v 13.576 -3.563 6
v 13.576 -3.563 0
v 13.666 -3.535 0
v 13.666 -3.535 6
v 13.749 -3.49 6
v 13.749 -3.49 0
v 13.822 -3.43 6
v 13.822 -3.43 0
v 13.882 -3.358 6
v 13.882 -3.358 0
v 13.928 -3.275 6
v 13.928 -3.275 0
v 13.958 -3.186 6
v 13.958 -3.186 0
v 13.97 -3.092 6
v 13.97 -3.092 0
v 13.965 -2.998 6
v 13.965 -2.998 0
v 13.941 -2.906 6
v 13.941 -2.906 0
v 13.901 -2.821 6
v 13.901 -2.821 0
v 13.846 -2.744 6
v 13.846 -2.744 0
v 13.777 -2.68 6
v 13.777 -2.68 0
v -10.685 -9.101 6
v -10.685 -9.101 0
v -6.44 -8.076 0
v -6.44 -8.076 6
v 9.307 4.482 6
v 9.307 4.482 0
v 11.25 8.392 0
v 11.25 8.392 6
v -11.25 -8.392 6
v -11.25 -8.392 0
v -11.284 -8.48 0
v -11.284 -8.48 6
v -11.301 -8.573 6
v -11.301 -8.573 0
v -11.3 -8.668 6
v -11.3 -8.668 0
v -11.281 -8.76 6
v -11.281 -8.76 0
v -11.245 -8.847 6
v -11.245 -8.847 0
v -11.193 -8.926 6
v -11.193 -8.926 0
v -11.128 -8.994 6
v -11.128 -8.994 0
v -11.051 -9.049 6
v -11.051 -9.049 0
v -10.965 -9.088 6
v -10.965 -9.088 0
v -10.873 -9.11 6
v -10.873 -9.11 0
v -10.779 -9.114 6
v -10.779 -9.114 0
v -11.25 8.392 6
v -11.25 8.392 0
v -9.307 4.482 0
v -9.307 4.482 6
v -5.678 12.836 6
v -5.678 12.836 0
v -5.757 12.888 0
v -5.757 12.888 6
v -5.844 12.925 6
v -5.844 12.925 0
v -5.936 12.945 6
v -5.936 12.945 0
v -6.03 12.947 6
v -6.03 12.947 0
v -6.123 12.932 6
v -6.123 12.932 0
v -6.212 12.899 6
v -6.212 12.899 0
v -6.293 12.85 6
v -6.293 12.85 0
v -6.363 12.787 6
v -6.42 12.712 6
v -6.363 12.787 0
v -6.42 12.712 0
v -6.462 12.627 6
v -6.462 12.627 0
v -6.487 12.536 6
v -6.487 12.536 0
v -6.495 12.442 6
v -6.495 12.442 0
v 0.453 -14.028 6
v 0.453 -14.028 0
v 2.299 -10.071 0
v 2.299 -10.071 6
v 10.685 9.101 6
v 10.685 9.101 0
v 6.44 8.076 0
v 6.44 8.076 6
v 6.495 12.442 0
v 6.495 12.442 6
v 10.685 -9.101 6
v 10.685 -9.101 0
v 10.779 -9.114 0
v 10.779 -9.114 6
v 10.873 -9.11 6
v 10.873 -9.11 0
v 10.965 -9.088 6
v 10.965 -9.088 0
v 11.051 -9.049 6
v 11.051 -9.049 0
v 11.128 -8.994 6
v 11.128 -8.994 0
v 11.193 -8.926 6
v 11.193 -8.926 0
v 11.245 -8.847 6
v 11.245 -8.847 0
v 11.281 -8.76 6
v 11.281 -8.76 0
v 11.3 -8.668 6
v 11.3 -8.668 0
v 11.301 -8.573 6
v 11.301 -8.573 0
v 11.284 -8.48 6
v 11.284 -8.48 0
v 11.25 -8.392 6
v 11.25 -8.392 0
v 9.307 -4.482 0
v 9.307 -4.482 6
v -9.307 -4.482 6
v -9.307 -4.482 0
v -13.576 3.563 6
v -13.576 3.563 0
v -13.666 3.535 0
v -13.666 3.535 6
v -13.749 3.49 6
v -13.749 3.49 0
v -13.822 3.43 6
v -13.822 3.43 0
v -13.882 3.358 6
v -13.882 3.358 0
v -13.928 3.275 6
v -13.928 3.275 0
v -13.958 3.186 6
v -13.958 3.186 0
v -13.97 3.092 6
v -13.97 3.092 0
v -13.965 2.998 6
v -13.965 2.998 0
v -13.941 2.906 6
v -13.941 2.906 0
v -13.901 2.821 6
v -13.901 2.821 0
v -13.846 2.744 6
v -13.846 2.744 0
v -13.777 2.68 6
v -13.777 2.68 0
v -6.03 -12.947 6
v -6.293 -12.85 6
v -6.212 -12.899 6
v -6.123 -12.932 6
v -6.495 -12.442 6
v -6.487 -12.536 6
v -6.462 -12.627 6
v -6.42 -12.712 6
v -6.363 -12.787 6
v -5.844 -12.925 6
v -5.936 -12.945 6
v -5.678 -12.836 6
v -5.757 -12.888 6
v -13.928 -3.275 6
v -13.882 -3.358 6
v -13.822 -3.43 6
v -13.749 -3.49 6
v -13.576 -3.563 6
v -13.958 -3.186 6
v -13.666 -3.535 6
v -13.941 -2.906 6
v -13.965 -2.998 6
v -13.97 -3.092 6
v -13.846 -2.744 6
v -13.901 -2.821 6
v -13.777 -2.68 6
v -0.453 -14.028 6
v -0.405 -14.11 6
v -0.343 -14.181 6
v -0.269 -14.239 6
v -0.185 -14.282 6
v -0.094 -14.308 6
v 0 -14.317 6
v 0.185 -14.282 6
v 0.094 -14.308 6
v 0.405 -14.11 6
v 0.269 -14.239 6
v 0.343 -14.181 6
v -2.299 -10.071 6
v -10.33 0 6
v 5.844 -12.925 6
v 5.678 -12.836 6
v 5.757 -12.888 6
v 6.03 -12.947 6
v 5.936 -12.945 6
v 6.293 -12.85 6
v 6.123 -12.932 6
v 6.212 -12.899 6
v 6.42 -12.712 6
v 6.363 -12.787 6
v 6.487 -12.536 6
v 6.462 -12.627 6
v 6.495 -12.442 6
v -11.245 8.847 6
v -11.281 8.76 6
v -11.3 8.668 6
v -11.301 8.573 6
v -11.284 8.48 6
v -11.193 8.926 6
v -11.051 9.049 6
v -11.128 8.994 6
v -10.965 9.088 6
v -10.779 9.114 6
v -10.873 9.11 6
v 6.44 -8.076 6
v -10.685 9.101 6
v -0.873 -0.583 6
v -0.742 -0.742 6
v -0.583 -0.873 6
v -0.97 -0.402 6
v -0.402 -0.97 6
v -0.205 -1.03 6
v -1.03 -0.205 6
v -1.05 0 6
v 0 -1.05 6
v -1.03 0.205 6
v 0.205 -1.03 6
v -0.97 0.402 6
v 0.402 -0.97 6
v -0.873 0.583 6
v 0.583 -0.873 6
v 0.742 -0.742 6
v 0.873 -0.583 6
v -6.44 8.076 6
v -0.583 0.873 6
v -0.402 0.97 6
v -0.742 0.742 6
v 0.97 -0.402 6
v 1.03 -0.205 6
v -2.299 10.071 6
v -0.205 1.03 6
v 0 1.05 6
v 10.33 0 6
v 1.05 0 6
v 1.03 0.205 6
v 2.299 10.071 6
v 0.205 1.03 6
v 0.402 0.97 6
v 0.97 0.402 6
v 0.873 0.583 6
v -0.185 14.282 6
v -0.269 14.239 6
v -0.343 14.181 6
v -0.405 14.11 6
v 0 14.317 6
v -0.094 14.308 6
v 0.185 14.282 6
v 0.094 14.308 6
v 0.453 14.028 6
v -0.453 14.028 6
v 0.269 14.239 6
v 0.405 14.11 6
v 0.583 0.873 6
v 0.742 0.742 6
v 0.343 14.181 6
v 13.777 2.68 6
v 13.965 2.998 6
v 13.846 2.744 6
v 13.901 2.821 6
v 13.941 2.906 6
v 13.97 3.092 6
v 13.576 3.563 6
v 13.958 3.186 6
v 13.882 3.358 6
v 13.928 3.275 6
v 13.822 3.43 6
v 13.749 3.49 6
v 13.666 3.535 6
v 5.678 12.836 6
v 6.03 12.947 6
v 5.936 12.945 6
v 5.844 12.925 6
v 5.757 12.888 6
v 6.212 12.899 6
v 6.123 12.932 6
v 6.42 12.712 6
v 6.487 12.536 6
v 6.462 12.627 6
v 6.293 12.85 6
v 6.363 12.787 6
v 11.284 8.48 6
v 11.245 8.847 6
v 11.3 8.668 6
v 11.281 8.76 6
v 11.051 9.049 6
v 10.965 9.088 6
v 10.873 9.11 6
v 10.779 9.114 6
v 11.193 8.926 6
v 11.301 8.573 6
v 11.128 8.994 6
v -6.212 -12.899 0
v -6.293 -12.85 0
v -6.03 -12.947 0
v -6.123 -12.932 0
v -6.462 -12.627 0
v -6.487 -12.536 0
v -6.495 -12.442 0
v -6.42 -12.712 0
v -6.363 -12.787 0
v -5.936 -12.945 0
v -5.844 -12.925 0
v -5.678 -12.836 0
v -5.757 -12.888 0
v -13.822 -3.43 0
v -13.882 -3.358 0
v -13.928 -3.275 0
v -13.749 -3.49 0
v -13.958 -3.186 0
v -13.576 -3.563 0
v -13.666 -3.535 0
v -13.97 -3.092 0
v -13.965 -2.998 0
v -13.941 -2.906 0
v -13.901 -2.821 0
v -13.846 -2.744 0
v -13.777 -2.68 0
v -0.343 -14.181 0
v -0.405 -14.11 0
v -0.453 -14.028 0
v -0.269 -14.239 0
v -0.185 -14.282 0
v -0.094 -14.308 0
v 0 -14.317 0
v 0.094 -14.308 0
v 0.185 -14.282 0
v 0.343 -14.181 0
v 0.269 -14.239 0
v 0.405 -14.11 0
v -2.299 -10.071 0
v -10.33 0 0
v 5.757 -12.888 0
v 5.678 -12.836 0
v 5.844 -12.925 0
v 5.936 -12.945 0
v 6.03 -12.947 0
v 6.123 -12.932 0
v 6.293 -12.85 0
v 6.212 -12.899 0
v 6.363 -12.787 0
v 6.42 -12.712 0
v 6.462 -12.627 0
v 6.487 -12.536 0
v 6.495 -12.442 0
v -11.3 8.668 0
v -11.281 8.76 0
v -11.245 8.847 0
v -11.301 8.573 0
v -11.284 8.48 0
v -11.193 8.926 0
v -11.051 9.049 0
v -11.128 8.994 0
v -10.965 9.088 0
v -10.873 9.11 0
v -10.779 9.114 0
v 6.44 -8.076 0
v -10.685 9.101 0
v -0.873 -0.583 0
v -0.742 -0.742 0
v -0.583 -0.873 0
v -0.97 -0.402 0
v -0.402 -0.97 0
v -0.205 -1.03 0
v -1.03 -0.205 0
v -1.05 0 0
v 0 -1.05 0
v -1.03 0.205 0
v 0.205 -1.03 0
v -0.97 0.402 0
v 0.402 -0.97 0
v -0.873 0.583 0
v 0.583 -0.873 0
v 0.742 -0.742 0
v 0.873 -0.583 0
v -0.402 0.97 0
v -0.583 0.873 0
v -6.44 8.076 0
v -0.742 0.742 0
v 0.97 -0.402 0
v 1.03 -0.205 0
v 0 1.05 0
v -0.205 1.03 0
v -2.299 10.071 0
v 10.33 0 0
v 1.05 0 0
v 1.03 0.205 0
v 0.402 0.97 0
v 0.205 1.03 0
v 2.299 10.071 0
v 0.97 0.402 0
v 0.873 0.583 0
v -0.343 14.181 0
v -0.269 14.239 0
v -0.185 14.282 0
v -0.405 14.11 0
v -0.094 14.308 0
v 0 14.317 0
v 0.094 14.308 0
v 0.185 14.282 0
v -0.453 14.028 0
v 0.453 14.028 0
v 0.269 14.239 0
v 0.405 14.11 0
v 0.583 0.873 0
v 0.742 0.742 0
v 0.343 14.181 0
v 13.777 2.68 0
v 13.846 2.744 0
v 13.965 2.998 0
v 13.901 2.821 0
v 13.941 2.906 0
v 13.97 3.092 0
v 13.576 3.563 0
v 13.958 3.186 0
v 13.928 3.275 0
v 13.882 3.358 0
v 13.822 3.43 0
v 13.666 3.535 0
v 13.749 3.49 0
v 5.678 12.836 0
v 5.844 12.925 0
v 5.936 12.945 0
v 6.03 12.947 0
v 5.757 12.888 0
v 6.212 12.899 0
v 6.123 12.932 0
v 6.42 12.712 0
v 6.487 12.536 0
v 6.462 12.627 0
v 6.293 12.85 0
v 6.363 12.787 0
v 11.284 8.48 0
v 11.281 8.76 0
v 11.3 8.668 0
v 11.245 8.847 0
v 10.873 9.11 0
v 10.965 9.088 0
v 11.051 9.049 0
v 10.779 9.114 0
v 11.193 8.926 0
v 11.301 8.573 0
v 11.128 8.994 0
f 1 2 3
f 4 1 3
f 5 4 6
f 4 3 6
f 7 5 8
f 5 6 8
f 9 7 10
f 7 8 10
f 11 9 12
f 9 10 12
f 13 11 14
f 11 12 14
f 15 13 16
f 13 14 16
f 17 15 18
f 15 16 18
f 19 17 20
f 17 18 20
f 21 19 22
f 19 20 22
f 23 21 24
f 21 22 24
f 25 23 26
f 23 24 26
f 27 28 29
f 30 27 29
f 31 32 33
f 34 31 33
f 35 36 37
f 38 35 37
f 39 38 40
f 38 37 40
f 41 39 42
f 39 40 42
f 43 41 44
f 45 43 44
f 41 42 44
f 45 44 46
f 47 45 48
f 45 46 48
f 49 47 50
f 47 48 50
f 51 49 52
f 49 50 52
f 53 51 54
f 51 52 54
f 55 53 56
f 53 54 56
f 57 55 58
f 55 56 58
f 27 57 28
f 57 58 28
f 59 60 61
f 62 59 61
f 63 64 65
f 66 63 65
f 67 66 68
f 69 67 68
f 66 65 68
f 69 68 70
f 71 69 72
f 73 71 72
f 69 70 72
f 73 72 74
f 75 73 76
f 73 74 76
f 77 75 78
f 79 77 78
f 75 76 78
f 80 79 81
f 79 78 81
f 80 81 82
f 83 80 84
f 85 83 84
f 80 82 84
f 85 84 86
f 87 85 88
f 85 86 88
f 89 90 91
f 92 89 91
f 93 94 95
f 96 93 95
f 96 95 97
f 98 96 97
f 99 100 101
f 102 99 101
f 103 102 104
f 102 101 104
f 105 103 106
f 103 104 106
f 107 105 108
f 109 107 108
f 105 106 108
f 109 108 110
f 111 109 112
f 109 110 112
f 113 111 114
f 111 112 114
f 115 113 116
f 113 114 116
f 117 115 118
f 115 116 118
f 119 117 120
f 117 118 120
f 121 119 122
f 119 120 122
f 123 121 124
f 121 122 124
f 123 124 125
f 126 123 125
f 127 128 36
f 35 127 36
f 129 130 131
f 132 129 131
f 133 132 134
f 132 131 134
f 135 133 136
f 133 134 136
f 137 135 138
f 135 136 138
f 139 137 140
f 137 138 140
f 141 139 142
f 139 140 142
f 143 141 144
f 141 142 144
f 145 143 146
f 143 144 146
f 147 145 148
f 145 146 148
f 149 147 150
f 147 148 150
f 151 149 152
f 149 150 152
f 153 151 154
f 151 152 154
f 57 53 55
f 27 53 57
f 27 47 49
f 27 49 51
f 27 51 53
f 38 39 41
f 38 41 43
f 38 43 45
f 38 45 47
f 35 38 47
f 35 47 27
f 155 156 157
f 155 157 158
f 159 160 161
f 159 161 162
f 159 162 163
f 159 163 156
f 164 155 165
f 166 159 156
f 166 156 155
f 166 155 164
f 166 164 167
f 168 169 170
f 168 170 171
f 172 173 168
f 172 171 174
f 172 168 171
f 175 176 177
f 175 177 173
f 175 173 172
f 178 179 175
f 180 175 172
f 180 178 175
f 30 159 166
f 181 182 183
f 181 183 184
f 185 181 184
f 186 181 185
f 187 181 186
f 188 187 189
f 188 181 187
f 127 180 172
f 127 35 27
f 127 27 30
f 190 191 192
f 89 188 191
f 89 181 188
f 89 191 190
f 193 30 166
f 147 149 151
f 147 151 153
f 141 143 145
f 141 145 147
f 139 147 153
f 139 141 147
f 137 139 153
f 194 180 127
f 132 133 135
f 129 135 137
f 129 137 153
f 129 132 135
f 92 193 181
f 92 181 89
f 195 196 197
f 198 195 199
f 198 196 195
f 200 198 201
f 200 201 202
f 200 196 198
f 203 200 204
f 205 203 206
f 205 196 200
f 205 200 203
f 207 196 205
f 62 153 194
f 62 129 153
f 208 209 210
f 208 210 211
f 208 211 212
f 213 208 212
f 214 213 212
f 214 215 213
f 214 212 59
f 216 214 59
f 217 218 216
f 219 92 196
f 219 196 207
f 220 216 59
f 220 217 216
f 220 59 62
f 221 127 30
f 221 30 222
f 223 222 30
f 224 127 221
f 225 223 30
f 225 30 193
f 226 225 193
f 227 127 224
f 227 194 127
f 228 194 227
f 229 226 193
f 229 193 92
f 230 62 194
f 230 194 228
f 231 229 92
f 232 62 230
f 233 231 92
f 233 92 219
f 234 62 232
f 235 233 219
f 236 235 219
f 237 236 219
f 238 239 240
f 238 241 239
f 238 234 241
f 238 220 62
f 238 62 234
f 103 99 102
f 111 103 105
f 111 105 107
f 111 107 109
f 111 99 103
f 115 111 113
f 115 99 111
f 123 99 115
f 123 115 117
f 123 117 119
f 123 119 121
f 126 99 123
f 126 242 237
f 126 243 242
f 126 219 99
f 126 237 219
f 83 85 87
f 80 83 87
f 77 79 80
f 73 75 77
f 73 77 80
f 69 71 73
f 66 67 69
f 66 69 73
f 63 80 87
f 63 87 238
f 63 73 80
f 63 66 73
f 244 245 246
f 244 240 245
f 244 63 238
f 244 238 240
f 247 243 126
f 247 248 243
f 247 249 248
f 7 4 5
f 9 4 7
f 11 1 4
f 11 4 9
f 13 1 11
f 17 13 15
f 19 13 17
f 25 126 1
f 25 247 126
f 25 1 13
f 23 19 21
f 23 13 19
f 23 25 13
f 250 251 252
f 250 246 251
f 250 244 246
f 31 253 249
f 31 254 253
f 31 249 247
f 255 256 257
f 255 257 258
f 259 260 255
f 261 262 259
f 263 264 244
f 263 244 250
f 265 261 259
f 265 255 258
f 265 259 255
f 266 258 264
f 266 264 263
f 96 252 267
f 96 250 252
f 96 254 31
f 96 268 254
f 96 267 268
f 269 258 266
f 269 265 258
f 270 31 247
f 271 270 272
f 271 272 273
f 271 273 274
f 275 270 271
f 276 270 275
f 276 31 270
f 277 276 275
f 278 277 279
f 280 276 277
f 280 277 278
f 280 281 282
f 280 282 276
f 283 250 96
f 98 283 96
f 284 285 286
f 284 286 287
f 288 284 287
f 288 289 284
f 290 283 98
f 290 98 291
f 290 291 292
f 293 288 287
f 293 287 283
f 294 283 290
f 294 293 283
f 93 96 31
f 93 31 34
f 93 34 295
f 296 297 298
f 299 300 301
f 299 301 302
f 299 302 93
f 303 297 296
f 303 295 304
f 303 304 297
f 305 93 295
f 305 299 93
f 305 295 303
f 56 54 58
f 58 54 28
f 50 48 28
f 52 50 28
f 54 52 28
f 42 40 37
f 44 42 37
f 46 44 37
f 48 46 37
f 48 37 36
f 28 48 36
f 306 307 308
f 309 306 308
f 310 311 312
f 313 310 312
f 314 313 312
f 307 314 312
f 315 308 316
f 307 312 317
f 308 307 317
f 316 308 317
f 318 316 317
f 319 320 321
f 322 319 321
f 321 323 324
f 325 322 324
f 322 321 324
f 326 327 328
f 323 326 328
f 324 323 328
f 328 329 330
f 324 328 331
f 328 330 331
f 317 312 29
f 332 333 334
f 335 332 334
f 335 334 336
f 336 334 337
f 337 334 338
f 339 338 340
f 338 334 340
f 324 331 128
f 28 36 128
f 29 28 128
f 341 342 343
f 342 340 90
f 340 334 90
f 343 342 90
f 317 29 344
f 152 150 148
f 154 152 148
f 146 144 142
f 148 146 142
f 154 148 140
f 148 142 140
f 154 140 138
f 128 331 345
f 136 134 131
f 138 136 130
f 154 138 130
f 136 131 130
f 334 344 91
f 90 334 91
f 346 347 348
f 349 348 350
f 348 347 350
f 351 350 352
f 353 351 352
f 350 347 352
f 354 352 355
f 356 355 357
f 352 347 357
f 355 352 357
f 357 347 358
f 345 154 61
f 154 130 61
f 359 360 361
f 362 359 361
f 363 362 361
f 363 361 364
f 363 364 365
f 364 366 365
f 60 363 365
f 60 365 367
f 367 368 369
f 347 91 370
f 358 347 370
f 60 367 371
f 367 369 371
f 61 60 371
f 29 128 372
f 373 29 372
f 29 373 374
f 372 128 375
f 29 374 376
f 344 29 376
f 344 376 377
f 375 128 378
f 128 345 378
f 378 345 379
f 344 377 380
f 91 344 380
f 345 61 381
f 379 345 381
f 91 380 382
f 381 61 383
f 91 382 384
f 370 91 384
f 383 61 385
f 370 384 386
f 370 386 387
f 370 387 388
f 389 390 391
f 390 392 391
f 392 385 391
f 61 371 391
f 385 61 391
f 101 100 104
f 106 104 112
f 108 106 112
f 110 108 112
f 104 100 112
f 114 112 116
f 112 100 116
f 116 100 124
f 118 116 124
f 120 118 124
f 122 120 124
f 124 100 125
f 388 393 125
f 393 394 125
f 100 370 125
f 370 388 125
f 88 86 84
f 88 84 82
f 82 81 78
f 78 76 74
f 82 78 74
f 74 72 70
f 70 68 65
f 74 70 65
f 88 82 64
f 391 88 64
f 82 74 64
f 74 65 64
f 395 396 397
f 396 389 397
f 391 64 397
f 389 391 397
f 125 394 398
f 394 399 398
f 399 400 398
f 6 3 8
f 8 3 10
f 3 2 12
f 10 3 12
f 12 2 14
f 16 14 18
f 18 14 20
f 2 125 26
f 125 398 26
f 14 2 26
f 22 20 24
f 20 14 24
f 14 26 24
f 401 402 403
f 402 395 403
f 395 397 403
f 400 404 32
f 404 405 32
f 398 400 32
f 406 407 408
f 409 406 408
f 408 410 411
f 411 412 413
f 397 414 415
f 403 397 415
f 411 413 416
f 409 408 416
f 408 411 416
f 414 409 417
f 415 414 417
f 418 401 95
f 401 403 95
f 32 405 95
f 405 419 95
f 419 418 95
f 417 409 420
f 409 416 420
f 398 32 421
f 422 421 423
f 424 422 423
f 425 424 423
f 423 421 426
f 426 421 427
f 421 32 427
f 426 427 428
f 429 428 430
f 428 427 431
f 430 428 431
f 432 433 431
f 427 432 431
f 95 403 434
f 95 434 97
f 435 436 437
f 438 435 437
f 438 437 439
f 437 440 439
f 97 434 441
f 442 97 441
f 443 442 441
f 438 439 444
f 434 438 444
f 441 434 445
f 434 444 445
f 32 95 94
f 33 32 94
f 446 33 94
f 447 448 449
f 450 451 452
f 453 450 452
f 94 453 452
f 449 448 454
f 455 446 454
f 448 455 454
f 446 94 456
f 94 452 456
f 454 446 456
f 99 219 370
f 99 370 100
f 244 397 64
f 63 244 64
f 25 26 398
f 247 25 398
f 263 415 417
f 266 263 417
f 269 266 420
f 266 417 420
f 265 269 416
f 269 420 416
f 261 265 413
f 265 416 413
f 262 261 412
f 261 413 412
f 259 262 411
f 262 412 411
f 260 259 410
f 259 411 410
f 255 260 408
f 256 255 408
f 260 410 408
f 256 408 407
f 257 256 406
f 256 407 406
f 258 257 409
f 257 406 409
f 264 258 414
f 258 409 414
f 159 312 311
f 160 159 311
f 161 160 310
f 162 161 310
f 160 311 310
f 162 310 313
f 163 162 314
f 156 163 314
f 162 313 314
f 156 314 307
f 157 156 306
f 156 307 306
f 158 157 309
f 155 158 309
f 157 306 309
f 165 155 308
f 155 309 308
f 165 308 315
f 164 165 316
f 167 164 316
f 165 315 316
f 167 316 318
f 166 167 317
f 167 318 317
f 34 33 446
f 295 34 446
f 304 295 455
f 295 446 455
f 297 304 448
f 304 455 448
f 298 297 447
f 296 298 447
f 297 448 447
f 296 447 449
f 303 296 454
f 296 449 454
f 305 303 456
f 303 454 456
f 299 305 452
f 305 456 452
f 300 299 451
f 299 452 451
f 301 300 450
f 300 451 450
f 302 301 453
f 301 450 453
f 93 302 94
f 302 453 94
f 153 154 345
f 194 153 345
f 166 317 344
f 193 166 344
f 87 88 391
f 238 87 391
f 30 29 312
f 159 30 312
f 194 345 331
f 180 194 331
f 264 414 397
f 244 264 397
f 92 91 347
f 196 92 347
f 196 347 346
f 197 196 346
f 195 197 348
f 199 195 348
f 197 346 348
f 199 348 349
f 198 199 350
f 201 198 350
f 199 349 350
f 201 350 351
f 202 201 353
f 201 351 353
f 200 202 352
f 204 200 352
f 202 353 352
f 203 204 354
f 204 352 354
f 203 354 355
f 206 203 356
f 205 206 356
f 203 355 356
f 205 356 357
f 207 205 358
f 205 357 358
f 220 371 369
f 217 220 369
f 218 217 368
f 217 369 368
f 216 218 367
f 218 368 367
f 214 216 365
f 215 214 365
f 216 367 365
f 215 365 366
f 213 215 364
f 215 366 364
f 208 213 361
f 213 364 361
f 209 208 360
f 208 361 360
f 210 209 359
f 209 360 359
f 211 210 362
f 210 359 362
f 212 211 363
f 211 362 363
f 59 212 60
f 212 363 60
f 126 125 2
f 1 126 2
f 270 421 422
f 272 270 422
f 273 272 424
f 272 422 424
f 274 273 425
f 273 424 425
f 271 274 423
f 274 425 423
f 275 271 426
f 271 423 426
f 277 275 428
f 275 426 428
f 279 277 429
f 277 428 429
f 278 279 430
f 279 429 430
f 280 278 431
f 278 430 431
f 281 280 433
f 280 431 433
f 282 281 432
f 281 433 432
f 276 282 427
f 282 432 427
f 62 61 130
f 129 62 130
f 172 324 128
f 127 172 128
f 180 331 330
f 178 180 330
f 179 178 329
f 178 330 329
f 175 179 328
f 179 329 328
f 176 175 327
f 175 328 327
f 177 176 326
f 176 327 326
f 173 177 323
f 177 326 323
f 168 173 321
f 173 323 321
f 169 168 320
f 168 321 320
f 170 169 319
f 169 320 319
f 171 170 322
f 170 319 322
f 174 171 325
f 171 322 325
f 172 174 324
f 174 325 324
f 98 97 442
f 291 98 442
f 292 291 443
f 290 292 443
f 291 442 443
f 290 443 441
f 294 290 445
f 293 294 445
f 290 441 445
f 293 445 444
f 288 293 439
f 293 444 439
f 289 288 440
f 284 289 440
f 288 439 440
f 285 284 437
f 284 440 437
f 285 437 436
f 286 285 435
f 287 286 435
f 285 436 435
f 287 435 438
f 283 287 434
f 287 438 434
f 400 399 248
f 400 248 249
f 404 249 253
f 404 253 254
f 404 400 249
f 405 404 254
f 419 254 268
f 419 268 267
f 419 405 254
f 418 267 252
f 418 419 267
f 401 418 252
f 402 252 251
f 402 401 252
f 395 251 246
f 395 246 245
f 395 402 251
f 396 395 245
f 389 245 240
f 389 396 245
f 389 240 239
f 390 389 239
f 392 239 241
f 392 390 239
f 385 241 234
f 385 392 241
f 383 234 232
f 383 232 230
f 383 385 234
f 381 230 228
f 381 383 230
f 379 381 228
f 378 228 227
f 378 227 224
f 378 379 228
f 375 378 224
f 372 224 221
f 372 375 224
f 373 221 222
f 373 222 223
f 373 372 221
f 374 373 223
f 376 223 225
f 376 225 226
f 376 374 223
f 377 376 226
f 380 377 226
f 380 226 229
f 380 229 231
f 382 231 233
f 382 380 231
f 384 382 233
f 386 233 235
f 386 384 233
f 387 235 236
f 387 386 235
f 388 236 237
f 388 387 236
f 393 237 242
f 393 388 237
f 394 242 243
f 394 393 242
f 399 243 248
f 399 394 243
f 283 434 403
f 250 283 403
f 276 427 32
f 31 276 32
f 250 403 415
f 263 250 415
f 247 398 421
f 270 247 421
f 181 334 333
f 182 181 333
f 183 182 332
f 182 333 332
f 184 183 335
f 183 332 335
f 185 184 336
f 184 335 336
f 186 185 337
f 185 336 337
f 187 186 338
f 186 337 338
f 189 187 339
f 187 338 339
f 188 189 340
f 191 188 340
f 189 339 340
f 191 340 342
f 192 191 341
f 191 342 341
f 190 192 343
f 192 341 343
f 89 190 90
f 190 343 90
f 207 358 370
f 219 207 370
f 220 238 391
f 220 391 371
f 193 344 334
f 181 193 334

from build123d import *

# Parameters (mm, degrees)
F0_R     = 1.05
F1_DEPTH = 6


with BuildPart() as f1:
    # F0 (on Top) → F1 (new body)
    with BuildSketch(Plane.XY):
        with BuildLine():
            Line((-2.298571, -10.070698), (-0.453154, -14.028208))
            ThreePointArc((-0.453154, -14.028208), (0, -14.316899), (0.453154, -14.028208))
            Line((0.453154, -14.028208), (2.298571, -10.070698))
            Line((2.298571, -10.070698), (5.678334, -12.835595))
            ThreePointArc((5.678334, -12.835595), (6.21187, -12.89908), (6.494889, -12.442363))
            Line((6.494889, -12.442363), (6.440453, -8.076073))
            Line((6.440453, -8.076073), (10.685158, -9.100735))
            ThreePointArc((10.685158, -9.100735), (11.193403, -8.926441), (11.250232, -8.392155))
            Line((11.250232, -8.392155), (9.306725, -4.481882))
            Line((9.306725, -4.481882), (13.575656, -3.563362))
            ThreePointArc((13.575656, -3.563362), (13.957945, -3.18581), (13.777328, -2.679778))
            Line((13.777328, -2.679778), (10.329685, 0))
            Line((10.329685, 0), (13.777328, 2.679778))
            ThreePointArc((13.777328, 2.679778), (13.957945, 3.18581), (13.575656, 3.563362))
            Line((13.575656, 3.563362), (9.306725, 4.481882))
            Line((9.306725, 4.481882), (11.250232, 8.392155))
            ThreePointArc((11.250232, 8.392155), (11.193403, 8.926441), (10.685158, 9.100735))
            Line((10.685158, 9.100735), (6.440453, 8.076073))
            Line((6.440453, 8.076073), (6.494889, 12.442363))
            ThreePointArc((6.494889, 12.442363), (6.21187, 12.89908), (5.678334, 12.835595))
            Line((5.678334, 12.835595), (2.298571, 10.070698))
            Line((2.298571, 10.070698), (0.453154, 14.028208))
            ThreePointArc((0.453154, 14.028208), (0, 14.316899), (-0.453154, 14.028208))
            Line((-0.453154, 14.028208), (-2.298571, 10.070698))
            Line((-2.298571, 10.070698), (-5.678334, 12.835595))
            ThreePointArc((-5.678334, 12.835595), (-6.21187, 12.89908), (-6.494889, 12.442363))
            Line((-6.494889, 12.442363), (-6.440453, 8.076073))
            Line((-6.440453, 8.076073), (-10.685158, 9.100735))
            ThreePointArc((-10.685158, 9.100735), (-11.193403, 8.926441), (-11.250232, 8.392155))
            Line((-11.250232, 8.392155), (-9.306725, 4.481882))
            Line((-9.306725, 4.481882), (-13.575656, 3.563362))
            ThreePointArc((-13.575656, 3.563362), (-13.957945, 3.18581), (-13.777328, 2.679778))
            Line((-13.777328, 2.679778), (-10.329685, 0))
            Line((-10.329685, 0), (-13.777328, -2.679778))
            ThreePointArc((-13.777328, -2.679778), (-13.957945, -3.18581), (-13.575656, -3.563362))
            Line((-13.575656, -3.563362), (-9.306725, -4.481882))
            Line((-9.306725, -4.481882), (-11.250232, -8.392155))
            ThreePointArc((-11.250232, -8.392155), (-11.193403, -8.926441), (-10.685158, -9.100735))
            Line((-10.685158, -9.100735), (-6.440453, -8.076073))
            Line((-6.440453, -8.076073), (-6.494889, -12.442363))
            ThreePointArc((-6.494889, -12.442363), (-6.21187, -12.89908), (-5.678334, -12.835595))
            Line((-5.678334, -12.835595), (-2.298571, -10.070698))
        make_face()
        Circle(F0_R, mode=Mode.SUBTRACT)
    extrude(amount=F1_DEPTH)


solid = f1.part
